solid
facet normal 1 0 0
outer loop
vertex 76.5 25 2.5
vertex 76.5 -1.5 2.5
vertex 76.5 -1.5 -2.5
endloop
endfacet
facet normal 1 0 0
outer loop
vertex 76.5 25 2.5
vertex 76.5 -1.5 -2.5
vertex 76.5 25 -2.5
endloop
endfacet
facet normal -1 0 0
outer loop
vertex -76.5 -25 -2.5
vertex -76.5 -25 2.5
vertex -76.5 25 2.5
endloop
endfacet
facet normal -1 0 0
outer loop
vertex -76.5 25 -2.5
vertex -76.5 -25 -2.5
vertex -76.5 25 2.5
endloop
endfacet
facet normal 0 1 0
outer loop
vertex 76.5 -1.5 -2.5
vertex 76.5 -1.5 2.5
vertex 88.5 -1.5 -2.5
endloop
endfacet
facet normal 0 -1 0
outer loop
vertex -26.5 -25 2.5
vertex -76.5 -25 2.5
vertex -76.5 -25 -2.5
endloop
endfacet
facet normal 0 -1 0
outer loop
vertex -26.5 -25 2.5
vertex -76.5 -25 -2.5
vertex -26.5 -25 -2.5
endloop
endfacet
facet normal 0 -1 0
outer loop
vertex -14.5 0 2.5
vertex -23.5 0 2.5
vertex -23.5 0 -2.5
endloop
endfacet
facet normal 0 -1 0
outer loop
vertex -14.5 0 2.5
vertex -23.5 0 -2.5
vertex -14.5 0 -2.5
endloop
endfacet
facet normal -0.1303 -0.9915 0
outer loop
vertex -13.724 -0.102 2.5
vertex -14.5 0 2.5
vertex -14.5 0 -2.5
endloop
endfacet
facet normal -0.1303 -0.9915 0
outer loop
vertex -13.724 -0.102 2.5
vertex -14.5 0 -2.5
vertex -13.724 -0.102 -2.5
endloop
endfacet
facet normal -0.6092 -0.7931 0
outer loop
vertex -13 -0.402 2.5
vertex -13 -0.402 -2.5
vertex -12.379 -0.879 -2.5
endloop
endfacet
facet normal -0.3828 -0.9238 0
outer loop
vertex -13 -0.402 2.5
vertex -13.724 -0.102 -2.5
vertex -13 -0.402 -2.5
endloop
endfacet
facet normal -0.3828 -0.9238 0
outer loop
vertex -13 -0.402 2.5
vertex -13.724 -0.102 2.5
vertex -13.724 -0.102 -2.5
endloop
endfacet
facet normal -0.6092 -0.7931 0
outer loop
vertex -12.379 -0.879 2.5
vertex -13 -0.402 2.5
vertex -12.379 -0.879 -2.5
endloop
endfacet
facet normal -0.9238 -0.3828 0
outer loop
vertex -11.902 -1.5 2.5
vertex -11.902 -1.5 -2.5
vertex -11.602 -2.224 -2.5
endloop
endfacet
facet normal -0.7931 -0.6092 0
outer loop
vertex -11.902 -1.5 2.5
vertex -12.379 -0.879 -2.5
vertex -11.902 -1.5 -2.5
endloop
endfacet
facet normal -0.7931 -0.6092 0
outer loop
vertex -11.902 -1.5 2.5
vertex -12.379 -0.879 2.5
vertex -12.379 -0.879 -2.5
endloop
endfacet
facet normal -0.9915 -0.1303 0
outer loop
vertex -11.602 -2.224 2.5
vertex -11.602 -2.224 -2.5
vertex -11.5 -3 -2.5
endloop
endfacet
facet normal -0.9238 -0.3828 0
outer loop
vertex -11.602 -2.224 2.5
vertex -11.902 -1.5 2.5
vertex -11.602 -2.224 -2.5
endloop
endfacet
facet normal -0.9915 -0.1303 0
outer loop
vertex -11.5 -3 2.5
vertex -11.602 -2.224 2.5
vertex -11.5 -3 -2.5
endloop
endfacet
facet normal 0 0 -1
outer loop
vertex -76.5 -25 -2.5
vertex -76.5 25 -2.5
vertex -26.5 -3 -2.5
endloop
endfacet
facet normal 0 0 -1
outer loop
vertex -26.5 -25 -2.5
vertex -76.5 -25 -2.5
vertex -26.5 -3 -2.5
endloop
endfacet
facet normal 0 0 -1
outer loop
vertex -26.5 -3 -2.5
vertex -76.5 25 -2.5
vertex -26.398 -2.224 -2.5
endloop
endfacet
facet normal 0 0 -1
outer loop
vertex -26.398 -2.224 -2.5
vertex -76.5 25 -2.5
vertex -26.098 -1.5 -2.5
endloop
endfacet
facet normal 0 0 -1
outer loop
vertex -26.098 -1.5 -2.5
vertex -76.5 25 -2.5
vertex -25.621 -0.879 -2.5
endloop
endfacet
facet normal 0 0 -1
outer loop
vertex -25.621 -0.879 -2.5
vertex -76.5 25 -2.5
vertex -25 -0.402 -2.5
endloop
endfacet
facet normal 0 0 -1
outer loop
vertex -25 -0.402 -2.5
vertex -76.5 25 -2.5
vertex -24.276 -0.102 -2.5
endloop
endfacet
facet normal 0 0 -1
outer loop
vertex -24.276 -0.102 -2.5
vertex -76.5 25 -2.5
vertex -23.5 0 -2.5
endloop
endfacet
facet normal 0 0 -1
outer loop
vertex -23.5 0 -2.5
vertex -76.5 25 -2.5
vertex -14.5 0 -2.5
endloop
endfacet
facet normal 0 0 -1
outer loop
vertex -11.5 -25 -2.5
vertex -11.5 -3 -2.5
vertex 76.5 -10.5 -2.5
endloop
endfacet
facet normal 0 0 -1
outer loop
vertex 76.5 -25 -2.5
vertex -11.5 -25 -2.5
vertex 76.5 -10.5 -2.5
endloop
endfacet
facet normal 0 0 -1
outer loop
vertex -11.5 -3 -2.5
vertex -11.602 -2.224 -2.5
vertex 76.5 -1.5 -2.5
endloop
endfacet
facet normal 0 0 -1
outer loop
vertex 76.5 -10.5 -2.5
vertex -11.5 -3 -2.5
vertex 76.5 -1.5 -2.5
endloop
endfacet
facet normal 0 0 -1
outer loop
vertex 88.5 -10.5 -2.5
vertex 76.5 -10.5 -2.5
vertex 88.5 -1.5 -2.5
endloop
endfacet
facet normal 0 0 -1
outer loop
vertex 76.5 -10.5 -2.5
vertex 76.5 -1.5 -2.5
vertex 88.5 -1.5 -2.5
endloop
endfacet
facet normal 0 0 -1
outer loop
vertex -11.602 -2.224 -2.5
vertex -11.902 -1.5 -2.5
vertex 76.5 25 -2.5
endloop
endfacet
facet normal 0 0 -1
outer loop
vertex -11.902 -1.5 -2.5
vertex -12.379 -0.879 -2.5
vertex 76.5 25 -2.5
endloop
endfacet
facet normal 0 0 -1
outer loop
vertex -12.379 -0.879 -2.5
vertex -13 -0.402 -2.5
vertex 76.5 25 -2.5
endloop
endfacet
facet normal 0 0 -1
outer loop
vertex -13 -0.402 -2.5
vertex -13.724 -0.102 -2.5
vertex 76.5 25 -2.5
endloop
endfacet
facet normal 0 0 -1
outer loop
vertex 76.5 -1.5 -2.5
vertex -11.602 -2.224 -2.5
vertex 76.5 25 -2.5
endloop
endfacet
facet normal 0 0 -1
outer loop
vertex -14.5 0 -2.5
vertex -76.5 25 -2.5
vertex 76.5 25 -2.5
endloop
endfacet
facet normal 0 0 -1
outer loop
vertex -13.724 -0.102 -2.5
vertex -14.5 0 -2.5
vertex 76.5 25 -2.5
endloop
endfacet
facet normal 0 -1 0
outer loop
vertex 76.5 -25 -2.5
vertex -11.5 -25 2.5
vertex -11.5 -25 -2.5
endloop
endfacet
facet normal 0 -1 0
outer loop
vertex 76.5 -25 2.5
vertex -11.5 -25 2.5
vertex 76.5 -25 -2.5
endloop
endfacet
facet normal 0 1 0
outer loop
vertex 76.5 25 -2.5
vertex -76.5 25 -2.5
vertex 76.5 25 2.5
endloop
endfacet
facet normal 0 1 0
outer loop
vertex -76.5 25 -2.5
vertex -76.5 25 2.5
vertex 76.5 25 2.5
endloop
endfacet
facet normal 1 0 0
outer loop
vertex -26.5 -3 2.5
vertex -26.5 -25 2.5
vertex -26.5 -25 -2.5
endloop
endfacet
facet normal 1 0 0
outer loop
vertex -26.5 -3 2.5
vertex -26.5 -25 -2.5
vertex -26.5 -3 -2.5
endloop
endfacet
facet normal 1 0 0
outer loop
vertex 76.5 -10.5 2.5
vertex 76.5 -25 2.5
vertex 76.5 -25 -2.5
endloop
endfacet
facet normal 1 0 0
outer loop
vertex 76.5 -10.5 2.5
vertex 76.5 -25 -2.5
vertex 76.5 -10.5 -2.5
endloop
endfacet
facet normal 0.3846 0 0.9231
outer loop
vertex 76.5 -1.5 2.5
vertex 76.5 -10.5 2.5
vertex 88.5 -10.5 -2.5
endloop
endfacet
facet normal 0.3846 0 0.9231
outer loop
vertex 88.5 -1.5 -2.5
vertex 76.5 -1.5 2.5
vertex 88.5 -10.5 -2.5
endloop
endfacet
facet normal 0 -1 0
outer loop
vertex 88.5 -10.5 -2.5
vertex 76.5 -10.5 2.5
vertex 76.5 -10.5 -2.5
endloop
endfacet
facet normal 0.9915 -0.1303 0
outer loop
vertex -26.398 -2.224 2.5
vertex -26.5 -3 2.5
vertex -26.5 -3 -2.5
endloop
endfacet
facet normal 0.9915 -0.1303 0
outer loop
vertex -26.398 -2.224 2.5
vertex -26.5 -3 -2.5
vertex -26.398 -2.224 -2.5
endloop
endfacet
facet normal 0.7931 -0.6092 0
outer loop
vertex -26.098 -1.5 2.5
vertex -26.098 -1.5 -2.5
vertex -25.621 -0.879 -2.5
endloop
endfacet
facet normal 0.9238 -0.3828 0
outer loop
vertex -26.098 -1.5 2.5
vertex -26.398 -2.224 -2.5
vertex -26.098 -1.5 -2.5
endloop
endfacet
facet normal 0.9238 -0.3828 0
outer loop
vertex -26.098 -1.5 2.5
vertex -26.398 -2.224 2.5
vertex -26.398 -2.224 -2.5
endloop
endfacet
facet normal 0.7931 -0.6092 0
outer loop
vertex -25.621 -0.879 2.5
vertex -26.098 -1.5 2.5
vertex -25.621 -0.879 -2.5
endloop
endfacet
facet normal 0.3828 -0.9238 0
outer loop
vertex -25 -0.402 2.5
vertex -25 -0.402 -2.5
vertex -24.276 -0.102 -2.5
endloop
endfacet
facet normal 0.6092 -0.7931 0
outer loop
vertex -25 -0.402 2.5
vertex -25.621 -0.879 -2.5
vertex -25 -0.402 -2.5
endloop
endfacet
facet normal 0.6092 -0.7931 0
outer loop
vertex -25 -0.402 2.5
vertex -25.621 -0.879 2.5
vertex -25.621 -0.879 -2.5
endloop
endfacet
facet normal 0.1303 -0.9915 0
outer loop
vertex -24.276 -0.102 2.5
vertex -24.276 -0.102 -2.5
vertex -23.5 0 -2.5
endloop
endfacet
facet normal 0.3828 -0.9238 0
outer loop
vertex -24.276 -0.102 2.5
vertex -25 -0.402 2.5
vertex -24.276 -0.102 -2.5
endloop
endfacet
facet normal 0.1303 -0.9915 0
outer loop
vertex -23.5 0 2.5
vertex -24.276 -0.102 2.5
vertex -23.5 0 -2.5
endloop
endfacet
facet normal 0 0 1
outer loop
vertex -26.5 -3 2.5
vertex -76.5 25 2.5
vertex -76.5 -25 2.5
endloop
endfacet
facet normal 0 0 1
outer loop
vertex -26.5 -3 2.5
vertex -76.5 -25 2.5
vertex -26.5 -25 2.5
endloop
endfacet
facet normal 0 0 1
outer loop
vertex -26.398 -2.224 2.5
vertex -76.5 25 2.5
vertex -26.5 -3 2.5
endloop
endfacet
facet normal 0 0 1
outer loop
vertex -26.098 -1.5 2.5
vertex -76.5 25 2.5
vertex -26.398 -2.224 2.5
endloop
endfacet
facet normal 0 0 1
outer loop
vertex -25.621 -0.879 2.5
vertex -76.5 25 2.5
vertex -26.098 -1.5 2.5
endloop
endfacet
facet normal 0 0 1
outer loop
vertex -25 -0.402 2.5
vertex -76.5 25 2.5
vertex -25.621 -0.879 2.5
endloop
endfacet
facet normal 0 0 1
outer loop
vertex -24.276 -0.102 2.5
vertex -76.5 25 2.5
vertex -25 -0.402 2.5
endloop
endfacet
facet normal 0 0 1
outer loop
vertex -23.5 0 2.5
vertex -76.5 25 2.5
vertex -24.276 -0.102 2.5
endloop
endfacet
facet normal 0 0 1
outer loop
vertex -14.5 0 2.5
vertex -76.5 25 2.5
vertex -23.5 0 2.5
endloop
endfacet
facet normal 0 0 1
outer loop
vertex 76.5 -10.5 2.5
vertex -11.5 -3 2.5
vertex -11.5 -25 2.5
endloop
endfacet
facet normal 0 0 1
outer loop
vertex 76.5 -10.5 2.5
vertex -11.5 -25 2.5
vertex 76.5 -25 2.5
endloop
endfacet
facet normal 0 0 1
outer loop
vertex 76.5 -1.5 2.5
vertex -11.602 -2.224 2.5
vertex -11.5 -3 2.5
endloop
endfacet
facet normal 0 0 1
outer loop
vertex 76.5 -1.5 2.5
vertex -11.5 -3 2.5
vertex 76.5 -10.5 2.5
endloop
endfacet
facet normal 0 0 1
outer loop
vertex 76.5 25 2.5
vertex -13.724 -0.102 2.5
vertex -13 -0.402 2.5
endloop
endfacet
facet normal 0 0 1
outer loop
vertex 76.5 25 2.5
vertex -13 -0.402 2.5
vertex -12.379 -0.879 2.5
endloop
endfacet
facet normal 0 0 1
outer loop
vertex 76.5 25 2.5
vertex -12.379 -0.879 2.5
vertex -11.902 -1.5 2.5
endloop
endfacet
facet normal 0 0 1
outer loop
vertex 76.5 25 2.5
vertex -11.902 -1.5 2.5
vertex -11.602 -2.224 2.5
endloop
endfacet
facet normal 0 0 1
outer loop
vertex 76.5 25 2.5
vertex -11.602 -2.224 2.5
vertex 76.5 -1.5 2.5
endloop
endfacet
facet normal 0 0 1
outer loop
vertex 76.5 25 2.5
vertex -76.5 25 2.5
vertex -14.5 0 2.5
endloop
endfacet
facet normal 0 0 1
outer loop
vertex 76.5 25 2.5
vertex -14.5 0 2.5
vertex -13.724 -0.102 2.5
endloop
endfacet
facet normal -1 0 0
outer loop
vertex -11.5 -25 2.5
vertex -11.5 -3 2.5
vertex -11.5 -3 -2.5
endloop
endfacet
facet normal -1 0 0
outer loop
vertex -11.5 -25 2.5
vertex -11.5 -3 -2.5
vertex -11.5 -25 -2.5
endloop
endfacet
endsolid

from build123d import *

# Parameters (mm, degrees)
SKETCH1_W           = 153
SKETCH1_H           = 50
BOSS_EXTRUDE1_DEPTH = 2.5
CUT_EXTRUDE1_DEPTH  = 6
SKETCH5_W           = 5
SKETCH5_H           = 9
BOSS_EXTRUDE2_DEPTH = 12
CUT_EXTRUDE2_DEPTH  = 9


with BuildPart() as part:
    # Sketch1 → Boss-Extrude1 (new body, symmetric)
    with BuildSketch(Plane.XY):
        Rectangle(SKETCH1_W, SKETCH1_H)
    extrude(amount=BOSS_EXTRUDE1_DEPTH, both=True)

    # Sketch2 → Cut-Extrude1 (cut, through all)
    with BuildSketch(Plane.XY.offset(2.5)):
        with BuildLine():
            Line((-26.5, -25), (-26.5, -3))
            ThreePointArc((-26.5, -3), (-25.621320344, -0.878679656), (-23.5, 0))
            Line((-23.5, 0), (-14.5, 0))
            ThreePointArc((-14.5, 0), (-12.378679656, -0.878679656), (-11.5, -3))
            Line((-11.5, -3), (-11.5, -25))
            Line((-11.5, -25), (-26.5, -25))
        make_face()
    extrude(amount=-CUT_EXTRUDE1_DEPTH, mode=Mode.SUBTRACT)

    # Sketch5 → Boss-Extrude2 (add)
    with BuildSketch(Plane(origin=(76.5, 0, 0), x_dir=(0, 0, -1), z_dir=(1, 0, 0))):
        with Locations((0, -6)):
            Rectangle(SKETCH5_W, SKETCH5_H)
    extrude(amount=BOSS_EXTRUDE2_DEPTH)

    # Sketch7 → Cut-Extrude2 (cut)
    with BuildSketch(Plane.XZ.offset(10.5)):
        Polygon((76.5, 2.5), (88.5, -2.5), (88.5, 2.5), align=None)
    extrude(amount=-CUT_EXTRUDE2_DEPTH, mode=Mode.SUBTRACT)


solid = part.part
